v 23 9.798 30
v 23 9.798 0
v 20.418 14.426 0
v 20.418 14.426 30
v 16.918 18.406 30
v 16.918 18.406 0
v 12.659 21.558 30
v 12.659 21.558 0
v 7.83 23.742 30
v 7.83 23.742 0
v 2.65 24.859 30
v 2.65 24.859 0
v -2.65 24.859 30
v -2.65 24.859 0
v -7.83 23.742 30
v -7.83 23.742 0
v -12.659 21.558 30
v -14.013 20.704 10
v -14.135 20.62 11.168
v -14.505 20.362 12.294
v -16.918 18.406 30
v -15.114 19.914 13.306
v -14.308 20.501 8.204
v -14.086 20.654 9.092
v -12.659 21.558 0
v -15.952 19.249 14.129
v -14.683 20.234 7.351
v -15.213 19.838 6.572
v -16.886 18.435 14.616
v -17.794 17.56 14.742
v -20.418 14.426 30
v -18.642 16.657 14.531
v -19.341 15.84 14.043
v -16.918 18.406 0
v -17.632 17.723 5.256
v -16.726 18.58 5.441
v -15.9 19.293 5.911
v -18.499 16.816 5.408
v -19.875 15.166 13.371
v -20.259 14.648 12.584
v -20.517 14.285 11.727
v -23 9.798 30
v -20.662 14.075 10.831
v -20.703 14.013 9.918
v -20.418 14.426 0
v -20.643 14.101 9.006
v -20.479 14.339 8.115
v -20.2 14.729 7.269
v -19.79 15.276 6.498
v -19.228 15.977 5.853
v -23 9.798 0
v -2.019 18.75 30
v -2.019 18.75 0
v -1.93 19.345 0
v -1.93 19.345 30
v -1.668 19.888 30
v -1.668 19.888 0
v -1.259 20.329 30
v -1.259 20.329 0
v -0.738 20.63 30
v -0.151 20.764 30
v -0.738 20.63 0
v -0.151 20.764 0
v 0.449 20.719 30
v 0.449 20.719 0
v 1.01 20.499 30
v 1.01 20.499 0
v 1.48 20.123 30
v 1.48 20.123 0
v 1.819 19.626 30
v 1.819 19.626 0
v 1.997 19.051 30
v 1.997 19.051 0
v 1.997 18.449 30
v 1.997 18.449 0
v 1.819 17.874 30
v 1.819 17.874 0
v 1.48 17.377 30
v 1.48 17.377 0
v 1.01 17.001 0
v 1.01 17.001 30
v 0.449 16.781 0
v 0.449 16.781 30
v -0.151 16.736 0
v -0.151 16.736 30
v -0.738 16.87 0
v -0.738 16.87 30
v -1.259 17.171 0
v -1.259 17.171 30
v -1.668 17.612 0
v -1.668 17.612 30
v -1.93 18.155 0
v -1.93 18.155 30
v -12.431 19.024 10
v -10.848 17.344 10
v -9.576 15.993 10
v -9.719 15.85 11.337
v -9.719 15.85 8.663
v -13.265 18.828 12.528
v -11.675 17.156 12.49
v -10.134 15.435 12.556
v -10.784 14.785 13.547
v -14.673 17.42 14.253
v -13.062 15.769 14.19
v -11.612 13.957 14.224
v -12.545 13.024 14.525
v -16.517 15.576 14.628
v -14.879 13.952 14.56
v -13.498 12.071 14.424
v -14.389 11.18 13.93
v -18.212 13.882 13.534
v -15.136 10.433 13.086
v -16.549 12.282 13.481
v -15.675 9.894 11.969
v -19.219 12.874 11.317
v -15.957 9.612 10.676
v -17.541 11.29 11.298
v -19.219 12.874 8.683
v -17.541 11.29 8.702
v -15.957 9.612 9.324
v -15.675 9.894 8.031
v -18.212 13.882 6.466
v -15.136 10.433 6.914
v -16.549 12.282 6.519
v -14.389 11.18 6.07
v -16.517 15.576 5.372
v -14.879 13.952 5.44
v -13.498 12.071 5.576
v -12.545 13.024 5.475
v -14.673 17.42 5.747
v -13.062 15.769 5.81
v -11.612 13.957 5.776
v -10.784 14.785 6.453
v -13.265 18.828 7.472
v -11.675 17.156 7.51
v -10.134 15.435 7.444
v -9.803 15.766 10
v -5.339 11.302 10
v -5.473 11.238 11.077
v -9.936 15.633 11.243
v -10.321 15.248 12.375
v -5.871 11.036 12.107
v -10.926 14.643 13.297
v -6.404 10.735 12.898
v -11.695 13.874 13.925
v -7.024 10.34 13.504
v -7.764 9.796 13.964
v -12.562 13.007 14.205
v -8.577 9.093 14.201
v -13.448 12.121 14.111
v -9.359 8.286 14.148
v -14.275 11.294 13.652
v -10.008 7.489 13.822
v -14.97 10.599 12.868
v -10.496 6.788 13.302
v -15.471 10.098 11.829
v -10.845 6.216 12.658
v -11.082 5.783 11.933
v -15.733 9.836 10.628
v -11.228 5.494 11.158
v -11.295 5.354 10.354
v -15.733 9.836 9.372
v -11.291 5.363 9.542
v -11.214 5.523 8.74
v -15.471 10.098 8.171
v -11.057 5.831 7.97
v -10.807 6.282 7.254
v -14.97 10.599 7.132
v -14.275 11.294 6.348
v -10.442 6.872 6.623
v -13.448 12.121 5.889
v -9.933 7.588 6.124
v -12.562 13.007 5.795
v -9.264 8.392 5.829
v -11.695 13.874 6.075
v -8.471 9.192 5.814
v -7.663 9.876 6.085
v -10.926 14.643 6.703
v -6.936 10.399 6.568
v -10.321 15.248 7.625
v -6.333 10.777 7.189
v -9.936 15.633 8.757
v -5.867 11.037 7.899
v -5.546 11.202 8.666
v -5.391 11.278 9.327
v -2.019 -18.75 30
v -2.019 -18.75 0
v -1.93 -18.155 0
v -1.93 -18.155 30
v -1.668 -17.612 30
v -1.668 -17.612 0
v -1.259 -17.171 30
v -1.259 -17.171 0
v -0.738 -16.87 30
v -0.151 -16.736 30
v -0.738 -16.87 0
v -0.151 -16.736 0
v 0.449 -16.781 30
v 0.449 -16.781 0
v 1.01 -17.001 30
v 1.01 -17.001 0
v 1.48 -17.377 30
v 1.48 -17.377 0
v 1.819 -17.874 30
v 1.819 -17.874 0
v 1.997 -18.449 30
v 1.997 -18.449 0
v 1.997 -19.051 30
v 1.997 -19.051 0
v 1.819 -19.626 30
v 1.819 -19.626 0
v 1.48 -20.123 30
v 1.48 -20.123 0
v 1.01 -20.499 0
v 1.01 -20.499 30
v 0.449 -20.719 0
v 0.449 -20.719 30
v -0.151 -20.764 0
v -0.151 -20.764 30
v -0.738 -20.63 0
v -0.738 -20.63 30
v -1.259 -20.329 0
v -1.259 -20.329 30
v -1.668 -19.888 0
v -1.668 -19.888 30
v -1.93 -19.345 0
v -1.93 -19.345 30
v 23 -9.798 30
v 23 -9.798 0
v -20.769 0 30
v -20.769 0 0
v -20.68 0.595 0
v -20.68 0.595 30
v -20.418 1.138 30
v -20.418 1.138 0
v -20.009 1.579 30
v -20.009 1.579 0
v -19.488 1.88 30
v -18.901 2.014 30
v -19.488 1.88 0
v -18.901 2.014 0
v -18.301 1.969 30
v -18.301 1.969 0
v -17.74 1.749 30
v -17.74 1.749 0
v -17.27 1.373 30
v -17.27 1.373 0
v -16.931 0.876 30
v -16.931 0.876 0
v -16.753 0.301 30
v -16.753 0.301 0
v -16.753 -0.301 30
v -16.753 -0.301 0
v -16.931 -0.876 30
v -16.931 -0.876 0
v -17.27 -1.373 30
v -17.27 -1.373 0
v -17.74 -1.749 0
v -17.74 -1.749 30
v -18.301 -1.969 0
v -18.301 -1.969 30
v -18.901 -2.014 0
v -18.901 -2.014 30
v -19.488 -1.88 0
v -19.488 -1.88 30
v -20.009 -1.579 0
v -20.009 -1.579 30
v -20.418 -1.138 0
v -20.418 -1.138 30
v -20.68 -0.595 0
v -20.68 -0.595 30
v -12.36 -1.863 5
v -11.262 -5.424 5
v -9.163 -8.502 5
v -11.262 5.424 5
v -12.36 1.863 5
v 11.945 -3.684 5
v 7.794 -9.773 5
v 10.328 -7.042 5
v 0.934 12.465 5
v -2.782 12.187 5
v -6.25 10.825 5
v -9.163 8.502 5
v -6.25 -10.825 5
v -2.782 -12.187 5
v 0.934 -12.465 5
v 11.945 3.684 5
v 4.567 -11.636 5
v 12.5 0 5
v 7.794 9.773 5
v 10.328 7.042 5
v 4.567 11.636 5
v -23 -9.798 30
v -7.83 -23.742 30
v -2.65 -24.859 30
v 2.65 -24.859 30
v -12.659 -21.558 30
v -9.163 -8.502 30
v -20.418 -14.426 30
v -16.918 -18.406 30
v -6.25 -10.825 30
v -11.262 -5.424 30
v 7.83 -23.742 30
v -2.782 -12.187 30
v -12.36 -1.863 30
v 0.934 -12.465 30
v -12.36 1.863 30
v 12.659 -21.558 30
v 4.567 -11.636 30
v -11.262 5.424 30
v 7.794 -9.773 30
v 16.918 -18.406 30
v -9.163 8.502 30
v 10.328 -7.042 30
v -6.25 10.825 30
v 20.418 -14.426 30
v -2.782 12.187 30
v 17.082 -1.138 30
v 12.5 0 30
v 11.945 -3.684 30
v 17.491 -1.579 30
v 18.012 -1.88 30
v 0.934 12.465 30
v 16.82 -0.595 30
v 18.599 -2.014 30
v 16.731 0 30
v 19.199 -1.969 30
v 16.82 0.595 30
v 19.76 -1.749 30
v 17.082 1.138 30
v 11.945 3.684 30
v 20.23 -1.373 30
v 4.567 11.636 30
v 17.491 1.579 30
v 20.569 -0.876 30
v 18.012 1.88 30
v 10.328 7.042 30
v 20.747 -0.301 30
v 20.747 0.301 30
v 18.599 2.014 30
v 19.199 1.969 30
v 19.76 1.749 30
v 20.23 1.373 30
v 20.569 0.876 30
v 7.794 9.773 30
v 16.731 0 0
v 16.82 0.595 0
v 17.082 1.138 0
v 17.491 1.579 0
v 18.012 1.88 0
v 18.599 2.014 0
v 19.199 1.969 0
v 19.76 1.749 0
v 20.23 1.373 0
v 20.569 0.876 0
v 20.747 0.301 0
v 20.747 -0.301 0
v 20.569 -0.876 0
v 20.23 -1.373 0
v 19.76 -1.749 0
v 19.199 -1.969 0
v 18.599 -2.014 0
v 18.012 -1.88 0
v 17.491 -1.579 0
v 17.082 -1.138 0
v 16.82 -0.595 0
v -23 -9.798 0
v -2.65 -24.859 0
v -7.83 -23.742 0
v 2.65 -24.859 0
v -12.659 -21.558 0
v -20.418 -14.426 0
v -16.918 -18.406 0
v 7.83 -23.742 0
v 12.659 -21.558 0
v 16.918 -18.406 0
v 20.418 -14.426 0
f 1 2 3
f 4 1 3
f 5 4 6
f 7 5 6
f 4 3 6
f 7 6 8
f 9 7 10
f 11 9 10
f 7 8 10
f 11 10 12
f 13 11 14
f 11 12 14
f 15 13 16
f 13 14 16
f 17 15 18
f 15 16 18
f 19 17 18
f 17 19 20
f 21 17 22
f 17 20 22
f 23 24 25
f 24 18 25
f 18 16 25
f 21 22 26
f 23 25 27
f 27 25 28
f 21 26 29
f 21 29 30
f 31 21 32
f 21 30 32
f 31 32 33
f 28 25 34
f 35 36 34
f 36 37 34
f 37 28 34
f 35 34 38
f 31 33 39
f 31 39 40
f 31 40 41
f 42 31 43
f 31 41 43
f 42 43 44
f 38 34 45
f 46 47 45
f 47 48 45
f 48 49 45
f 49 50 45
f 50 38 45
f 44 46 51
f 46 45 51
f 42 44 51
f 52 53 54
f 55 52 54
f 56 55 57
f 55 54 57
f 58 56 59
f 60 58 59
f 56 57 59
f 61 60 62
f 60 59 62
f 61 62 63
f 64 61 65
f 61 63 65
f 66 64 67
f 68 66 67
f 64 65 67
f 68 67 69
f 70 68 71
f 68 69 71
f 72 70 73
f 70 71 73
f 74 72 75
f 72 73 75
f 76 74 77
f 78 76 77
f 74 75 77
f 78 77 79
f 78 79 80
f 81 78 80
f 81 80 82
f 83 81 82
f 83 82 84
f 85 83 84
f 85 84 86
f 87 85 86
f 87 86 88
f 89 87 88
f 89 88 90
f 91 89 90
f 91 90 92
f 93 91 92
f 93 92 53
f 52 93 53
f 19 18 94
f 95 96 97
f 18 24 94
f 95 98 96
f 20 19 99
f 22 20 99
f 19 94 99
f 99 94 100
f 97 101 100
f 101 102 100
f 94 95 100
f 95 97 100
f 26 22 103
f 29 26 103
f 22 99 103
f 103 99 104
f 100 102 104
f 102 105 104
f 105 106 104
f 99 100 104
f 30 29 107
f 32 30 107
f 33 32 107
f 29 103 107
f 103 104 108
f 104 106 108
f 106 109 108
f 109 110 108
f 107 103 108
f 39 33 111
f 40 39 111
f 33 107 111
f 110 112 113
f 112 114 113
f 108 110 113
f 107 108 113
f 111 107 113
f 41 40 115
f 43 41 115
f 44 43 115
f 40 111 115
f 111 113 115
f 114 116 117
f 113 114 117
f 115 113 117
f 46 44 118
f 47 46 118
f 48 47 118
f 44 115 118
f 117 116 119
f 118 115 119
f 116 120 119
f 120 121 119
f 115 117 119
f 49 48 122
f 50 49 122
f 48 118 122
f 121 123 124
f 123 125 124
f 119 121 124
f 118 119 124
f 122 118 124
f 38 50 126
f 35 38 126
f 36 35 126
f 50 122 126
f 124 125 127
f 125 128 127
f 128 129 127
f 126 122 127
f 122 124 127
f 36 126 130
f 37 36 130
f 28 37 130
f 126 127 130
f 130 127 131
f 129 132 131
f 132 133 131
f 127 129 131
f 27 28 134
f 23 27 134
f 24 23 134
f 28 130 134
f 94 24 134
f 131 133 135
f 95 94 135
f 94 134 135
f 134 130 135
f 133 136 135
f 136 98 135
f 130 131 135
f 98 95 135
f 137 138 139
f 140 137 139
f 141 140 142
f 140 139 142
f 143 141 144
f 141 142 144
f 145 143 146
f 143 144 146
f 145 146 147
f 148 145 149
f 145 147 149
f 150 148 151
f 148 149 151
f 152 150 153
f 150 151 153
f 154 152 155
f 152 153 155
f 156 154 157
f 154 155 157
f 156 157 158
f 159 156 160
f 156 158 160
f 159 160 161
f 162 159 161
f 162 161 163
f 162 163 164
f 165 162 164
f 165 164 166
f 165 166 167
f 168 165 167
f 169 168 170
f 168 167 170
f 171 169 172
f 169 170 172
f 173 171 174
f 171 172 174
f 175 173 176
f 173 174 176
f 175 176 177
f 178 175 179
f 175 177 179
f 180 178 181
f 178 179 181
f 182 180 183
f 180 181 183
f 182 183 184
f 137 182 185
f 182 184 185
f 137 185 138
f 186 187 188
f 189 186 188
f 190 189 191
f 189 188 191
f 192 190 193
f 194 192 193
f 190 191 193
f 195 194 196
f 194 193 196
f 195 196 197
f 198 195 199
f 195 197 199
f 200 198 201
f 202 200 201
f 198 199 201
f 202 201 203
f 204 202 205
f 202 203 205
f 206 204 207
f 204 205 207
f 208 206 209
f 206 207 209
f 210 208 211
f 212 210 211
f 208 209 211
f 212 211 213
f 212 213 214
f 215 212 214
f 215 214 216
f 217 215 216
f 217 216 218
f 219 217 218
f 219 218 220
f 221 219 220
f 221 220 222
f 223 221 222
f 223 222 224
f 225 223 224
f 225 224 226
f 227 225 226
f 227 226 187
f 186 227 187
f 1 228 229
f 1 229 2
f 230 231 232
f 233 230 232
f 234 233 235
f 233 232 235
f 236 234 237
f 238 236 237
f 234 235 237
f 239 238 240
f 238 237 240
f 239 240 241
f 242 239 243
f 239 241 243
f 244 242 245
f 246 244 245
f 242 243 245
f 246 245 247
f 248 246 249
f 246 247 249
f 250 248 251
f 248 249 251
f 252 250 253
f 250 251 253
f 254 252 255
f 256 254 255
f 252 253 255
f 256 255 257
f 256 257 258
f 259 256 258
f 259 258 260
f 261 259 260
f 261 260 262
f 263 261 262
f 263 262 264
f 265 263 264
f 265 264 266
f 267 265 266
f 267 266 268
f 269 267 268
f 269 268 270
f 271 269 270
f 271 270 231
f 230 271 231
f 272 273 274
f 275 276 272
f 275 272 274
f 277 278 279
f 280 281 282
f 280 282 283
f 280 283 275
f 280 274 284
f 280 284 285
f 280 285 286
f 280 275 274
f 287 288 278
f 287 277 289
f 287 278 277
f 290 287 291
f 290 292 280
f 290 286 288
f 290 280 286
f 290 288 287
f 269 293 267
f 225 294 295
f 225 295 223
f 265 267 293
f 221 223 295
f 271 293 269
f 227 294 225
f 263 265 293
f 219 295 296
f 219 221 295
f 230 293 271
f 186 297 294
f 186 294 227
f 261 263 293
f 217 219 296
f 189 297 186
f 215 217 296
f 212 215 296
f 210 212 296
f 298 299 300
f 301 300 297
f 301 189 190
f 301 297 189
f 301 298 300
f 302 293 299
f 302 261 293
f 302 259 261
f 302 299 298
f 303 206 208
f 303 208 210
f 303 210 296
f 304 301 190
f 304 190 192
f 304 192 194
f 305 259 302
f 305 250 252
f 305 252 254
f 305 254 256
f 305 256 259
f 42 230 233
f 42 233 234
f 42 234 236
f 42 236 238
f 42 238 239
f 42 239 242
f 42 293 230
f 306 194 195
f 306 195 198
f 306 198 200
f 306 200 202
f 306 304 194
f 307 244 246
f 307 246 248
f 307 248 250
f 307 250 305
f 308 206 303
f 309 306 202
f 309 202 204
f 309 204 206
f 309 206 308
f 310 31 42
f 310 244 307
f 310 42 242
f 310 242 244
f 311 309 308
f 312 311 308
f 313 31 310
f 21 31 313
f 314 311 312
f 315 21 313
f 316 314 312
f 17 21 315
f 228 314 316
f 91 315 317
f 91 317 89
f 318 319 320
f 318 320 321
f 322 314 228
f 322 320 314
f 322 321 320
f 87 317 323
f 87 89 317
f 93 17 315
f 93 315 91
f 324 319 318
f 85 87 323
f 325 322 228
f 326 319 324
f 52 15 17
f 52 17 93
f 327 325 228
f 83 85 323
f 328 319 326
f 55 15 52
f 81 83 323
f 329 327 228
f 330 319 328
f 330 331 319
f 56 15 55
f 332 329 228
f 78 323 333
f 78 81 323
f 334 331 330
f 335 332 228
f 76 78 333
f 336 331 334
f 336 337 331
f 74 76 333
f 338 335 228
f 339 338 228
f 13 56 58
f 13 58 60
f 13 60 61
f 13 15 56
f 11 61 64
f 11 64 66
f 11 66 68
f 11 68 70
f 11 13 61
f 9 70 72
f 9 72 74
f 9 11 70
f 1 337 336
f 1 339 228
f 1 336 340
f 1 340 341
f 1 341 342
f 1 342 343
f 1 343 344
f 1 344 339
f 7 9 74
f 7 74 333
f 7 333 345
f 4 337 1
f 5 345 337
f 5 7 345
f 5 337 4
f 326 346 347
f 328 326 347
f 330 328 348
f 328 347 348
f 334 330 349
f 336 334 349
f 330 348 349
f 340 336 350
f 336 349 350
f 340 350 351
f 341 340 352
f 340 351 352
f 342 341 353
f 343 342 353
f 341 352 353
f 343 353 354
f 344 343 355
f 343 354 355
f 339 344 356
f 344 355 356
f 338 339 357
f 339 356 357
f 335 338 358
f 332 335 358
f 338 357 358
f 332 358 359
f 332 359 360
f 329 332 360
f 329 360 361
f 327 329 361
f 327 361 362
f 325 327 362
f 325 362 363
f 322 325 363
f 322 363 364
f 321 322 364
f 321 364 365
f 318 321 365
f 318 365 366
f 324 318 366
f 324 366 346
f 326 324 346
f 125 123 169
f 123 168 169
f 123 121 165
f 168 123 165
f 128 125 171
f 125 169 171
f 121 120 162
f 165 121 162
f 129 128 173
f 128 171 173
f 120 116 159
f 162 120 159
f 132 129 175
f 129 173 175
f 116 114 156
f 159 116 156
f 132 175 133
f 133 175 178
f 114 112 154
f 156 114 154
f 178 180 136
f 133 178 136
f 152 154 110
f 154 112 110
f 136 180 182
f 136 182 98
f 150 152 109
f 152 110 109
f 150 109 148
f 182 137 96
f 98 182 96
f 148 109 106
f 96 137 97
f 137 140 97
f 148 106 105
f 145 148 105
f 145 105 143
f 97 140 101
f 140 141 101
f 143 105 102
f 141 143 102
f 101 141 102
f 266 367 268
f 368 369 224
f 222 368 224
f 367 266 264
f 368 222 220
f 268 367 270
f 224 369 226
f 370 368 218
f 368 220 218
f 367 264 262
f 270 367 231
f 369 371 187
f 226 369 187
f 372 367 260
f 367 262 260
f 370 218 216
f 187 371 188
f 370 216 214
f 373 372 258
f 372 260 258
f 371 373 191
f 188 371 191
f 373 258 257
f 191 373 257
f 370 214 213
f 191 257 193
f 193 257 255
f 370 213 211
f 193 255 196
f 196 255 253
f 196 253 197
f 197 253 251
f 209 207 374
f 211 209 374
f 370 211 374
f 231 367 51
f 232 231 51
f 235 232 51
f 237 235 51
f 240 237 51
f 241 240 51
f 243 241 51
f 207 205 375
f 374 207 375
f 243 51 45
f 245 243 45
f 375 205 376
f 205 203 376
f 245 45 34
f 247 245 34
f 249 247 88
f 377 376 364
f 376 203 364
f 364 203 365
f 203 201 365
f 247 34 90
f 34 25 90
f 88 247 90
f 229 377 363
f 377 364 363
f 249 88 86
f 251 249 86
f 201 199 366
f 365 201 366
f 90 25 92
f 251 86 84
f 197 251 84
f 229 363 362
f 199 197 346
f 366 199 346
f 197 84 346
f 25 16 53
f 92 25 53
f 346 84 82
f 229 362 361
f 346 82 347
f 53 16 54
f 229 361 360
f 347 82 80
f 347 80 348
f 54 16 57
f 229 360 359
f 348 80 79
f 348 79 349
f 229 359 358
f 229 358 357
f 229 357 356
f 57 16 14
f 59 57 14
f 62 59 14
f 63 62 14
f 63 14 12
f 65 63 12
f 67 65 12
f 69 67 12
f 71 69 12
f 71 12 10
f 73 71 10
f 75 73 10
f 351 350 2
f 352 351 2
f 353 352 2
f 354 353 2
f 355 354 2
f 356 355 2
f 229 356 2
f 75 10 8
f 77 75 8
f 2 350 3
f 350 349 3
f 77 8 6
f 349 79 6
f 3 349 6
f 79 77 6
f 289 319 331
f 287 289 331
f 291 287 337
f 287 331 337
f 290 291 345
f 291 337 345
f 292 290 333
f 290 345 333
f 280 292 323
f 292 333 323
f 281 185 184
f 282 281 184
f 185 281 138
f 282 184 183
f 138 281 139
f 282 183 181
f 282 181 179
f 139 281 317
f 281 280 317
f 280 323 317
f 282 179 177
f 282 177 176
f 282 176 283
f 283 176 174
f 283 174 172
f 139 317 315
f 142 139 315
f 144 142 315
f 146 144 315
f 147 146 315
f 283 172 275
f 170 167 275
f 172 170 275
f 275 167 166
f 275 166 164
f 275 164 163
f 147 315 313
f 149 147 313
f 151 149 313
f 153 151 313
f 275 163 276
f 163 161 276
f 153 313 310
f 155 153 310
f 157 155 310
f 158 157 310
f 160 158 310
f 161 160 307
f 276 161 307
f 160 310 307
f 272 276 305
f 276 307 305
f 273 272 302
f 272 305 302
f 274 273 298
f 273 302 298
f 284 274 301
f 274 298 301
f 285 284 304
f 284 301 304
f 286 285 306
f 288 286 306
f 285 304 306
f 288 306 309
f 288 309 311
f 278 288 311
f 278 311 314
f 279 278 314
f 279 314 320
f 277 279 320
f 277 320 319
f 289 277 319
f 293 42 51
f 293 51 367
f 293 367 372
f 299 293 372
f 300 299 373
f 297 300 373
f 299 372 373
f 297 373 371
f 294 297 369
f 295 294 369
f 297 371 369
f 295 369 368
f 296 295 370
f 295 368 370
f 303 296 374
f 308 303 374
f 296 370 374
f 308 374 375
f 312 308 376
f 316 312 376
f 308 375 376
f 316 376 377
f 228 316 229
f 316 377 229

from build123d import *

# Parameters (mm, degrees)
BOSS_EXTRUDE1_DEPTH    = 30
SKETCH6_R              = 12.5
CUT_EXTRUDE1_DEPTH     = 25
F_10_32_TAPPED_HOLE1_D = 4.0386


# Read off the part's stored shape, not the designer's step: 1/8 NPT Tapped Hole1
with BuildPart() as part:
    # Sketch2 → Boss-Extrude1 (new body)
    with BuildSketch(Plane.XY):
        with BuildLine():
            Line((-23, 9.797958971), (-23, -9.797958971))
            ThreePointArc((-23, -9.797958971), (0, -25), (23, -9.797958971))
            Line((23, -9.797958971), (23, 9.797958971))
            ThreePointArc((23, 9.797958971), (0, 25), (-23, 9.797958971))
        make_face()
    extrude(amount=BOSS_EXTRUDE1_DEPTH)

    # Sketch6 → Cut-Extrude1 (cut)
    with BuildSketch(Plane(origin=(0, 0, 30), x_dir=(-1, 0, 0), z_dir=(0, 0, 1))):
        with Locations(Location((0, 0, 0), (0, 0, 180))):
            Circle(SKETCH6_R)
    extrude(amount=-CUT_EXTRUDE1_DEPTH, mode=Mode.SUBTRACT)

    # #10-32 Tapped Hole1 (through all)
    with Locations(Plane.XY.offset(30)):
        with Locations((-18.75, 0), (0, 18.75), (18.75, 0), (0, -18.75)):
            Hole(F_10_32_TAPPED_HOLE1_D / 2)

    # 1/8 NPT Tapped Hole1 outline → 1/8 NPT Tapped Hole1 (revolve, cut)
    with BuildSketch(Plane(origin=(0, 0, 10), x_dir=(0.707106781186546, 0.707106781186549, 0), z_dir=(0, 0, -1))):
        Polygon((4.744600282, -25.000243213), (4.537398933, -18.08), (4.2164, -18.08), (4.2164, -11.766981388), (0, -11.766981388), (0, -25.000243213), align=None)
    revolve(axis=Axis((0, 0, 10), (0.707106781186549, -0.707106781186546, 0)), mode=Mode.SUBTRACT)


solid = part.part
